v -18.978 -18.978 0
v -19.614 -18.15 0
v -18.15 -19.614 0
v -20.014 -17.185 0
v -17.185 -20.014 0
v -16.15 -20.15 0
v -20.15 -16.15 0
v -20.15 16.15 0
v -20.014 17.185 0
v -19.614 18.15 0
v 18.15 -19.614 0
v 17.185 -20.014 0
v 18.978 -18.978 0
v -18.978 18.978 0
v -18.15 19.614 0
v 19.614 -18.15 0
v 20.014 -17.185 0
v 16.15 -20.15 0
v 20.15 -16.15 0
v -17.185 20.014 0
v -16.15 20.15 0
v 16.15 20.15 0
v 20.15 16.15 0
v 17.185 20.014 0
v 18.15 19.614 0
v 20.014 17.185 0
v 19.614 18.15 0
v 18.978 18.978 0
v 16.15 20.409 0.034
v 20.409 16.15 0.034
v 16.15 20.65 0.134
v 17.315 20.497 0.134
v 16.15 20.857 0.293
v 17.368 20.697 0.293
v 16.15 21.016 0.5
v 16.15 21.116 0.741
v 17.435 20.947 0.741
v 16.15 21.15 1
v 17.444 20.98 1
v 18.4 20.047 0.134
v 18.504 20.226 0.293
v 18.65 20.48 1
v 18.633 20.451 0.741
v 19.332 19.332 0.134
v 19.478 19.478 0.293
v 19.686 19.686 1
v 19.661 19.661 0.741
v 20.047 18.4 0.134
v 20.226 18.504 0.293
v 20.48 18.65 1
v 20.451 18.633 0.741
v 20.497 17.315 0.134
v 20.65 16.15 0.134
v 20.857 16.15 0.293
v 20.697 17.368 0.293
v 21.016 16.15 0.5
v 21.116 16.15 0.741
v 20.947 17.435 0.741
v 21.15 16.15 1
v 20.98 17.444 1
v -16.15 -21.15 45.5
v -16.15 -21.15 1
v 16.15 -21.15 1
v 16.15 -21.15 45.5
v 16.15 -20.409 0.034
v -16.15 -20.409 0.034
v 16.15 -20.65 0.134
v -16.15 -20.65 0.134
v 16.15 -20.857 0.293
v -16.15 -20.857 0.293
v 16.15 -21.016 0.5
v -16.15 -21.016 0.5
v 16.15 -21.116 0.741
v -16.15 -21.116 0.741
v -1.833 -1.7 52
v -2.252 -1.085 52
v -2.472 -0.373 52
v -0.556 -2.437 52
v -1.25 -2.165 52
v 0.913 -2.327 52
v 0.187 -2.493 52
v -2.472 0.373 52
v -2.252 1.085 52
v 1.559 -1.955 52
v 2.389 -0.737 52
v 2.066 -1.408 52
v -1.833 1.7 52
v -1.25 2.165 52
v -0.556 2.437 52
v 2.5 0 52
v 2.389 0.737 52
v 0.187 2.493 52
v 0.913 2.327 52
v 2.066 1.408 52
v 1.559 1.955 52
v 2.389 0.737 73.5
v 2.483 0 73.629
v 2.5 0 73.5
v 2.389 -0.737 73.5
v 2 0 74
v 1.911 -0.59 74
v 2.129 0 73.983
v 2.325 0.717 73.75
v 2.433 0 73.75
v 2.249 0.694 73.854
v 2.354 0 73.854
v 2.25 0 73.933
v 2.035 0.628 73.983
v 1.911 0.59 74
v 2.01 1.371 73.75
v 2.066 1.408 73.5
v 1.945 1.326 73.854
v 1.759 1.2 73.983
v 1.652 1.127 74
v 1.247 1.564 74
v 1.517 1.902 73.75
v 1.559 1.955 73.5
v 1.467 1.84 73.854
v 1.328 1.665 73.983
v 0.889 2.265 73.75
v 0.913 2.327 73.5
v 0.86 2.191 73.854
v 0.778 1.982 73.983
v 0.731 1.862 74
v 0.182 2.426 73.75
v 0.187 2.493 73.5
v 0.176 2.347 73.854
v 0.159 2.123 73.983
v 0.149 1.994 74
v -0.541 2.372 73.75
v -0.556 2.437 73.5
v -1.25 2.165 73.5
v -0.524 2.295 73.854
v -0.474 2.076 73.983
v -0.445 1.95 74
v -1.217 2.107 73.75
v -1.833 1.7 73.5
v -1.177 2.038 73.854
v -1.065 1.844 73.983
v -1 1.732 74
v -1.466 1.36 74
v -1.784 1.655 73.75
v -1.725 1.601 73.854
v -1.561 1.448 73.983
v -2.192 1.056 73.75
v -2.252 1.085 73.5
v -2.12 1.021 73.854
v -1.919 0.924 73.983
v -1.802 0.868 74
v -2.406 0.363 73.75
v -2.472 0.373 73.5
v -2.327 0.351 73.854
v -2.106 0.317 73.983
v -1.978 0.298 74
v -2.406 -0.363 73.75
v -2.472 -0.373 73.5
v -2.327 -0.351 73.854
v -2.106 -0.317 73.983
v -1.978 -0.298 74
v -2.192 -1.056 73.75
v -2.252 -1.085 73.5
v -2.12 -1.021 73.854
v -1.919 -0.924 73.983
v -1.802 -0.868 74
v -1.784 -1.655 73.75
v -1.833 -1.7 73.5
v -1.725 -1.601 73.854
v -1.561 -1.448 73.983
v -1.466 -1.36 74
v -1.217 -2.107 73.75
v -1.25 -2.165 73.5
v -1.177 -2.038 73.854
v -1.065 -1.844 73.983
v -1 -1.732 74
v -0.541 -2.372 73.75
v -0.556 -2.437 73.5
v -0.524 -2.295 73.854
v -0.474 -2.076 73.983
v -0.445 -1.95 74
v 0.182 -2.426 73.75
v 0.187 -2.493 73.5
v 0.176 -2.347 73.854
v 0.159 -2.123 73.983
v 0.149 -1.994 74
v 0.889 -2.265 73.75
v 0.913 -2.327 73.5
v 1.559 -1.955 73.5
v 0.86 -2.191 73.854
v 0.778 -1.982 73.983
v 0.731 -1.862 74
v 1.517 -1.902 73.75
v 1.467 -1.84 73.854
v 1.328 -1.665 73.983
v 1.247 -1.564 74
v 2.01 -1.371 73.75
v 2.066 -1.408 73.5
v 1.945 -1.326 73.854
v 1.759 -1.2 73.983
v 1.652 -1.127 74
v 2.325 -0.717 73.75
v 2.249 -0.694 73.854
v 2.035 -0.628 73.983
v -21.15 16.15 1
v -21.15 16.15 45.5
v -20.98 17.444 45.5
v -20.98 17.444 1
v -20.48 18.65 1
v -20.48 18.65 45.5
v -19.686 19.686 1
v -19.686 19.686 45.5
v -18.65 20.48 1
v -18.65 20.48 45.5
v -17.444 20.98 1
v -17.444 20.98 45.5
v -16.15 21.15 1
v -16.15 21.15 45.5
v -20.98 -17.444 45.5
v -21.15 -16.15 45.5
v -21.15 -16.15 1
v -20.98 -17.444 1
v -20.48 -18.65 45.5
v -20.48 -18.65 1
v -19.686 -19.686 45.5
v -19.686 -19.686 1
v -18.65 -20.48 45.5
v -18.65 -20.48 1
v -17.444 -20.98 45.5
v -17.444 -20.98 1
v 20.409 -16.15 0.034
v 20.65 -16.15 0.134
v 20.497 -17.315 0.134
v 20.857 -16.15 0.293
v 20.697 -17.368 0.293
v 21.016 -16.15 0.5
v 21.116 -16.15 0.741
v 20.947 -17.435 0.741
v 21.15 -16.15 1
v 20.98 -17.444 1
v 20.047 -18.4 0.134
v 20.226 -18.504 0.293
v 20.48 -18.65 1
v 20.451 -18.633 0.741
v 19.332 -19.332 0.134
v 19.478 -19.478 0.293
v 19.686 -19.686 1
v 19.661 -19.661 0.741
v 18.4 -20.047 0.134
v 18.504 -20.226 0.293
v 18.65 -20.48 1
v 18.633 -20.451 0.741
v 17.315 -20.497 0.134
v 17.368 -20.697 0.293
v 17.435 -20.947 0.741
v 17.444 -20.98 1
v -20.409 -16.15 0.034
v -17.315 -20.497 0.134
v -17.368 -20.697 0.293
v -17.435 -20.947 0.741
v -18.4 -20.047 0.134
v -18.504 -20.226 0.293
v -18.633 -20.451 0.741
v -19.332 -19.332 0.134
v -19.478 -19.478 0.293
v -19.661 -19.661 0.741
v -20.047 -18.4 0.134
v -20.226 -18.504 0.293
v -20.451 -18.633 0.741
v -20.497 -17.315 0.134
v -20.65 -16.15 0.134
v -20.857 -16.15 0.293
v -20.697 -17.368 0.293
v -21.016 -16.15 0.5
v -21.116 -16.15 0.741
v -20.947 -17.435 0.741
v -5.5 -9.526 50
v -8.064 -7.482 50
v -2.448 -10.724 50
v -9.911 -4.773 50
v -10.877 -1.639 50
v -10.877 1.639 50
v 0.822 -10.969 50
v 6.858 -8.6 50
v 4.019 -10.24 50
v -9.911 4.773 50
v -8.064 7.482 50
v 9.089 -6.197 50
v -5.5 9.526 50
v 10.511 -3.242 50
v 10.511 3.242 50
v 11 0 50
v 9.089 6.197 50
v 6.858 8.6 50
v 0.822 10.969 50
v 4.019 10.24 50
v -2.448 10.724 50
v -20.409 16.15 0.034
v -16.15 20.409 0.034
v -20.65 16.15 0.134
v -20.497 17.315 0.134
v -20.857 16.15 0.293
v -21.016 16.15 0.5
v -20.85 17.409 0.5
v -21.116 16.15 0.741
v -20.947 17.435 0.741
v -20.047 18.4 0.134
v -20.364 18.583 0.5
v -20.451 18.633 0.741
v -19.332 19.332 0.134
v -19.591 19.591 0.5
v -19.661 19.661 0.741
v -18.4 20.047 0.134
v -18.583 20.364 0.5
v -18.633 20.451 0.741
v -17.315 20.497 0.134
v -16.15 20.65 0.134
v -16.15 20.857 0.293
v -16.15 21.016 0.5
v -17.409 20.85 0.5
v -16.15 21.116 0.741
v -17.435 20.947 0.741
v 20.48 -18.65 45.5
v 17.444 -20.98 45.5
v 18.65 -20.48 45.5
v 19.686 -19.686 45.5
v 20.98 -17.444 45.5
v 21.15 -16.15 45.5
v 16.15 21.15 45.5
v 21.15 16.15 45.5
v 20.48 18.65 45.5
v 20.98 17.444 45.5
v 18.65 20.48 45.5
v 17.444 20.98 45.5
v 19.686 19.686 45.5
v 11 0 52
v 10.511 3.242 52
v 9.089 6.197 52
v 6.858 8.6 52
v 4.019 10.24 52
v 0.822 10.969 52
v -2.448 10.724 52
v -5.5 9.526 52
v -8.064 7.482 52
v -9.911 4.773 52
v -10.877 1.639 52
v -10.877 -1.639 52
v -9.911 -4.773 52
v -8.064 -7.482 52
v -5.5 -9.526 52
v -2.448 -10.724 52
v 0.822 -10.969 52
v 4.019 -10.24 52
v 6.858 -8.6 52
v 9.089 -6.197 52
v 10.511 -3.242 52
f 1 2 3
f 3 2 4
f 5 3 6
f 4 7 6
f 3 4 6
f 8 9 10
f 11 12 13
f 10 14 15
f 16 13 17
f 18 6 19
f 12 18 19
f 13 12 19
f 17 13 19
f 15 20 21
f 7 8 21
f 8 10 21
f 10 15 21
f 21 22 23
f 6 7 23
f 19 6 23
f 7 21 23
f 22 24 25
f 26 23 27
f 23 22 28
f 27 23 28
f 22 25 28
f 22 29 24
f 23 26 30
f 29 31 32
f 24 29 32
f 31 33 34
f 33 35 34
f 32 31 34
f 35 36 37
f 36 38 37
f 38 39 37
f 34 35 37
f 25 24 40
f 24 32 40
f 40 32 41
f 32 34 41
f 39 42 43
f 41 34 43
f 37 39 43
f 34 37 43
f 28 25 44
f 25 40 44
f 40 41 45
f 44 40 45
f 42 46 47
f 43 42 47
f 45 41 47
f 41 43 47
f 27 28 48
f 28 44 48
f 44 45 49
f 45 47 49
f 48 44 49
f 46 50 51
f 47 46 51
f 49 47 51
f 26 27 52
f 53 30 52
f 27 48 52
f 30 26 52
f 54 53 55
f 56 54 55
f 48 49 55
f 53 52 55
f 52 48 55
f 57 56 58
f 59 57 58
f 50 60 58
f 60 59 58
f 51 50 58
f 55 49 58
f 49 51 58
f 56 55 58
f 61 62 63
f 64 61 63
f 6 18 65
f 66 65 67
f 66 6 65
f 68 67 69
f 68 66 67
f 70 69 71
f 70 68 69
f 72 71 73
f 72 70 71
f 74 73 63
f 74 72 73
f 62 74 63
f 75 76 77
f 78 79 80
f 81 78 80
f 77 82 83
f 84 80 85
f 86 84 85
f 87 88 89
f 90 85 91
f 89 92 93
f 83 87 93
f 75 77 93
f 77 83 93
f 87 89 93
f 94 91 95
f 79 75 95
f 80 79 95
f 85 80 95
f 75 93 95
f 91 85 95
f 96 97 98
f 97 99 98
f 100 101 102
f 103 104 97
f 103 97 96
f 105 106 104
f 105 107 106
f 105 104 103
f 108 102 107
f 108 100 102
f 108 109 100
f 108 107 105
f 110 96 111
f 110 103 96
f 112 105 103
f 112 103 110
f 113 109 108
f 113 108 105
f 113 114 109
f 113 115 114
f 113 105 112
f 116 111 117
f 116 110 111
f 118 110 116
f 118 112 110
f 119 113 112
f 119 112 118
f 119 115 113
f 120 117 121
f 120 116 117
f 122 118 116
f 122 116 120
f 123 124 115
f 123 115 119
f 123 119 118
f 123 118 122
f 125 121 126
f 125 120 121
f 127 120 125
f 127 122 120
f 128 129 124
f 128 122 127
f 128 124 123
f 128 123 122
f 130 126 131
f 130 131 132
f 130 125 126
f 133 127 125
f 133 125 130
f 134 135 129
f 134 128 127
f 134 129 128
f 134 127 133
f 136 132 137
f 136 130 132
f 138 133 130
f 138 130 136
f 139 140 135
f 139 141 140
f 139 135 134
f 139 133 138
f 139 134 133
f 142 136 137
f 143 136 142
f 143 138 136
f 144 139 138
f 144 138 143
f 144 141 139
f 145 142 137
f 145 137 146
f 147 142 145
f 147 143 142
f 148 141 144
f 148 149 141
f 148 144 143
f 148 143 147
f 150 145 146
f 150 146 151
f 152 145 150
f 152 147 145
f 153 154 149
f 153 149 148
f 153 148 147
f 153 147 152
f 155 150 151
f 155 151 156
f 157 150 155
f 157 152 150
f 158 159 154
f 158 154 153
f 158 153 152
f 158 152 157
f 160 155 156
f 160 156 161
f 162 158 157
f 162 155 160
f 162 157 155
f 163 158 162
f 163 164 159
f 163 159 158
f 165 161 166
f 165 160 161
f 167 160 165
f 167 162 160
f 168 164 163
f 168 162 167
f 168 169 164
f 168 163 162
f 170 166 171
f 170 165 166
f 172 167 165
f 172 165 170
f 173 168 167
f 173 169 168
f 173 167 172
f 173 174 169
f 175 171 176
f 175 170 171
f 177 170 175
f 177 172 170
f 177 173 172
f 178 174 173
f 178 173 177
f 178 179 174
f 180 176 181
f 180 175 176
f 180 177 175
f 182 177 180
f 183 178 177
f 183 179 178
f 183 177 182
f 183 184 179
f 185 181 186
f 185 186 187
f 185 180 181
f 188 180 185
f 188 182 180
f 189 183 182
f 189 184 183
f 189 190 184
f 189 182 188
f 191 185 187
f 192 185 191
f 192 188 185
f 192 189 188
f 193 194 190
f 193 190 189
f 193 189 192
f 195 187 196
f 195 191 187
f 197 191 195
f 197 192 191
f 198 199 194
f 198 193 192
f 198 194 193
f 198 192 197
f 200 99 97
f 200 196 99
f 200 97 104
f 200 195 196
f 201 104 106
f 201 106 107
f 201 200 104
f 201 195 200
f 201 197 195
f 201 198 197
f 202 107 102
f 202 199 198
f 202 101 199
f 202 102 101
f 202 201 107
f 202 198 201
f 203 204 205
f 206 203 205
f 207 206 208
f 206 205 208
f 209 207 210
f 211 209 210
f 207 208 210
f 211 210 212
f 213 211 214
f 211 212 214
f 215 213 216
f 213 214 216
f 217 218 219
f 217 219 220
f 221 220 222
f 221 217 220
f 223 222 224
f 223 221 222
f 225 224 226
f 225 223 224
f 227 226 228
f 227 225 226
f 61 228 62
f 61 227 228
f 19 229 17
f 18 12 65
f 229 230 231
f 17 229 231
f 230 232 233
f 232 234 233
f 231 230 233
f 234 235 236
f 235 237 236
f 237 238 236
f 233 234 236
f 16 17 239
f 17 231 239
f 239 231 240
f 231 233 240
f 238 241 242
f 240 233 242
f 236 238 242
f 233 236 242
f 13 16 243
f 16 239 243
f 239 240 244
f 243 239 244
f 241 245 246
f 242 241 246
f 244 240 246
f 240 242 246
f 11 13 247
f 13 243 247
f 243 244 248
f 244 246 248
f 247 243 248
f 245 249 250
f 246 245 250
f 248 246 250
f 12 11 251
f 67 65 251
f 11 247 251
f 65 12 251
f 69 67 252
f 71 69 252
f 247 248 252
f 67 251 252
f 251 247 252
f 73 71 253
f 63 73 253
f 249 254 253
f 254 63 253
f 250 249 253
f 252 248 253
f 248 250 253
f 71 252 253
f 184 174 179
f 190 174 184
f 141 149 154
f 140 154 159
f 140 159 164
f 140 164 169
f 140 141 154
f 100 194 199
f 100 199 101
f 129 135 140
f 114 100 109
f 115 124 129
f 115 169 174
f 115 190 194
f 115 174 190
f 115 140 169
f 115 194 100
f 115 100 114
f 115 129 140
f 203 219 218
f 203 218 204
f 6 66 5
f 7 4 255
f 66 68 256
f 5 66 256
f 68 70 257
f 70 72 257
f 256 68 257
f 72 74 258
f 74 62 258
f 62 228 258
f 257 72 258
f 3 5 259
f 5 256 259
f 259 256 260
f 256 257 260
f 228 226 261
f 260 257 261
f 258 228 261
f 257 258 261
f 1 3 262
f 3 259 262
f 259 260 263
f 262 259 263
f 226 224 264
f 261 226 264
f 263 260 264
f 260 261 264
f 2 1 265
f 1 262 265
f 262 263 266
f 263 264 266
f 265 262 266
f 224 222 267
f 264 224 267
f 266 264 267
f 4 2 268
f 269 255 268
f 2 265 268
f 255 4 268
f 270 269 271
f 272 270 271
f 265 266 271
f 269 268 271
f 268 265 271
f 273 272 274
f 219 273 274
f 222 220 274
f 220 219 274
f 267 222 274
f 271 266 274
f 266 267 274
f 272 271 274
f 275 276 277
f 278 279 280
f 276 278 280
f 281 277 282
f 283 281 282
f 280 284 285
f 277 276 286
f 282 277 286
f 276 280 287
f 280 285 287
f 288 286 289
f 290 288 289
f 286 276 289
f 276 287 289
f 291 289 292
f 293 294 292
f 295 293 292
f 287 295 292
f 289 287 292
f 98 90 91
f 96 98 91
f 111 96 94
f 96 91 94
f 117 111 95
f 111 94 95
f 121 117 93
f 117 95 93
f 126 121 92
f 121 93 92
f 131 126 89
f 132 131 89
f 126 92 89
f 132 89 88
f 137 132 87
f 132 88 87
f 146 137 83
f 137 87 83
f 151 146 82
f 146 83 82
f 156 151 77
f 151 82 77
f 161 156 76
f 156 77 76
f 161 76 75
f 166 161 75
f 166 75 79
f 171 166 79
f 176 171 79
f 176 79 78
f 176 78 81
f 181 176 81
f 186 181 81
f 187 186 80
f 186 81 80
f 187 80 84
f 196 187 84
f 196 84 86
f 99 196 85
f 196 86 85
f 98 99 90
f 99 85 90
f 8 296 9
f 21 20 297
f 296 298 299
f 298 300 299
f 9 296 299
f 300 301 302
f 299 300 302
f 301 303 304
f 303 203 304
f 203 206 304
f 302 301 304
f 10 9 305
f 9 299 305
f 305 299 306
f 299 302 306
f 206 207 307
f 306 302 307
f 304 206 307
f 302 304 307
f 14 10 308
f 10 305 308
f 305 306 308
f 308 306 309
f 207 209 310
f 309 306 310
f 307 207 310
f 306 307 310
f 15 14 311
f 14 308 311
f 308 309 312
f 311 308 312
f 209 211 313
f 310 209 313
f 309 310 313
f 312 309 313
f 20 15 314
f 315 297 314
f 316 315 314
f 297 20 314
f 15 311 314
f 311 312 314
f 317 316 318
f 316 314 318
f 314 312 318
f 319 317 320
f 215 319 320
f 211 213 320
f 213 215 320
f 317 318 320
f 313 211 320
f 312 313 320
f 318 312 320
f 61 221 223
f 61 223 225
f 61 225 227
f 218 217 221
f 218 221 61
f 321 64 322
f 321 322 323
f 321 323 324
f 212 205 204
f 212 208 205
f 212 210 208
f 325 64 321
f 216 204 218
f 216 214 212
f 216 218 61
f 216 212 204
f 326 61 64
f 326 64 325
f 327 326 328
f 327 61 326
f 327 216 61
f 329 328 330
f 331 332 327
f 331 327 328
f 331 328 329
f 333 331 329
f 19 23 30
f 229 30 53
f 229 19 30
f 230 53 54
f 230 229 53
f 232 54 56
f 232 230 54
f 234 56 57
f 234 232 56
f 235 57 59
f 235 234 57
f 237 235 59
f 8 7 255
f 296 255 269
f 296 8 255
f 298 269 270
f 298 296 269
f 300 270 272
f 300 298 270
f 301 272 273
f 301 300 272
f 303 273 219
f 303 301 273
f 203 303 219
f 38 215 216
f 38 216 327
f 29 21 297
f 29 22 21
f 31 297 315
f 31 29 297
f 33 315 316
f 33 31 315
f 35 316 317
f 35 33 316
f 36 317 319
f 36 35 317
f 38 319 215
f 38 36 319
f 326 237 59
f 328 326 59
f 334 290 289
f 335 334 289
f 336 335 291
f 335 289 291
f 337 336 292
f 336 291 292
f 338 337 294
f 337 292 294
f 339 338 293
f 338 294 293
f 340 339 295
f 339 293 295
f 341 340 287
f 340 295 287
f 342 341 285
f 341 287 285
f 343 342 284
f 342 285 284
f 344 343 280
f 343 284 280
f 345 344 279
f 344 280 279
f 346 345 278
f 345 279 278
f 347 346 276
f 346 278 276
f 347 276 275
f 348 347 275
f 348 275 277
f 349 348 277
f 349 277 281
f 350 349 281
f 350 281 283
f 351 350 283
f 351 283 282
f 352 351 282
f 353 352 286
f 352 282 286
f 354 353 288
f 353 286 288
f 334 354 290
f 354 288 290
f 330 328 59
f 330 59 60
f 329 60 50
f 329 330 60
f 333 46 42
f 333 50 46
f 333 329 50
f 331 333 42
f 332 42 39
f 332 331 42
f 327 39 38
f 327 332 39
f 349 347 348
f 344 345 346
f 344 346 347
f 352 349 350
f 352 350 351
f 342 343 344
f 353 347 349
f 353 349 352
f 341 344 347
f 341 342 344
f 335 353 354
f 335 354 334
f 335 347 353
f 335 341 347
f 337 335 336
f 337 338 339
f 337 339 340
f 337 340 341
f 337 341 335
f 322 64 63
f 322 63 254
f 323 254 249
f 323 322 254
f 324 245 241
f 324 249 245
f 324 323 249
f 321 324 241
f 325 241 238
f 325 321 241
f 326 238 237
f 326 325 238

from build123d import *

# Parameters (mm, degrees)
F1_W     = 42.3
F1_H     = 42.3
F1_R     = 1.5
F1_R_2   = 11
F1_R_3   = 2.5
F2_DEPTH = 45.5
F3_START = 50
F3_DEPTH = 2
F4_START = 52
F4_DEPTH = 22
F5_R     = 0.5
F6_R     = 5
F7_R     = 1


with BuildPart() as f2:
    # F1 (on Top) → F2 (new body)
    with BuildSketch(Plane.XY):
        Rectangle(F1_W, F1_H)
        with Locations((-15.5, -15.5)):
            Circle(F1_R, mode=Mode.SUBTRACT)
        with Locations((15.5, -15.5)):
            Circle(F1_R, mode=Mode.SUBTRACT)
        with Locations((-15.5, 15.5)):
            Circle(F1_R, mode=Mode.SUBTRACT)
        Circle(F1_R_2, mode=Mode.SUBTRACT)
        with Locations((15.5, 15.5)):
            Circle(F1_R, mode=Mode.SUBTRACT)
        Circle(F1_R_2)
        Circle(F1_R_3, mode=Mode.SUBTRACT)
        Circle(F1_R_3)
        with Locations((-15.5, 15.5)):
            Circle(F1_R)
        with Locations((-15.5, -15.5)):
            Circle(F1_R)
        with Locations((15.5, -15.5)):
            Circle(F1_R)
        with Locations((15.5, 15.5)):
            Circle(F1_R)
    extrude(amount=F2_DEPTH)

    # F6
    f6_edges = [f2.edges().sort_by_distance(p)[0] for p in [
        (21.15, 21.15, 22.75),
        (-21.15, 21.15, 22.75),
        (-21.15, -21.15, 22.75),
        (21.15, -21.15, 22.75),
    ]]
    fillet(f6_edges, radius=F6_R)

    # F7
    f7_edges = [f2.edges().sort_by_distance(p)[0] for p in [
        (0, 21.15, 0),
        (19.685534, 19.685534, 0),
        (-19.685534, 19.685534, 0),
        (21.15, 0, 0),
        (-21.15, 0, 0),
        (19.685534, -19.685534, 0),
        (-19.685534, -19.685534, 0),
        (0, -21.15, 0),
    ]]
    fillet(f7_edges, radius=F7_R)


with BuildPart() as f3:
    # F1 (on Top) → F3 (new body)
    with BuildSketch(Plane.XY.offset(F3_START)):
        Circle(F1_R_2)
        Circle(F1_R_3, mode=Mode.SUBTRACT)
        Circle(F1_R_3)
    extrude(amount=F3_DEPTH)


with BuildPart() as f4:
    # F1 (on Top) → F4 (new body)
    with BuildSketch(Plane.XY.offset(F4_START)):
        Circle(F1_R_3)
    extrude(amount=F4_DEPTH)

    # F5
    f5_edges = [f4.edges().sort_by_distance(p)[0] for p in [
        (-2.5, 0, 74),
    ]]
    fillet(f5_edges, radius=F5_R)


solid = Compound([f2.part, f3.part, f4.part])
